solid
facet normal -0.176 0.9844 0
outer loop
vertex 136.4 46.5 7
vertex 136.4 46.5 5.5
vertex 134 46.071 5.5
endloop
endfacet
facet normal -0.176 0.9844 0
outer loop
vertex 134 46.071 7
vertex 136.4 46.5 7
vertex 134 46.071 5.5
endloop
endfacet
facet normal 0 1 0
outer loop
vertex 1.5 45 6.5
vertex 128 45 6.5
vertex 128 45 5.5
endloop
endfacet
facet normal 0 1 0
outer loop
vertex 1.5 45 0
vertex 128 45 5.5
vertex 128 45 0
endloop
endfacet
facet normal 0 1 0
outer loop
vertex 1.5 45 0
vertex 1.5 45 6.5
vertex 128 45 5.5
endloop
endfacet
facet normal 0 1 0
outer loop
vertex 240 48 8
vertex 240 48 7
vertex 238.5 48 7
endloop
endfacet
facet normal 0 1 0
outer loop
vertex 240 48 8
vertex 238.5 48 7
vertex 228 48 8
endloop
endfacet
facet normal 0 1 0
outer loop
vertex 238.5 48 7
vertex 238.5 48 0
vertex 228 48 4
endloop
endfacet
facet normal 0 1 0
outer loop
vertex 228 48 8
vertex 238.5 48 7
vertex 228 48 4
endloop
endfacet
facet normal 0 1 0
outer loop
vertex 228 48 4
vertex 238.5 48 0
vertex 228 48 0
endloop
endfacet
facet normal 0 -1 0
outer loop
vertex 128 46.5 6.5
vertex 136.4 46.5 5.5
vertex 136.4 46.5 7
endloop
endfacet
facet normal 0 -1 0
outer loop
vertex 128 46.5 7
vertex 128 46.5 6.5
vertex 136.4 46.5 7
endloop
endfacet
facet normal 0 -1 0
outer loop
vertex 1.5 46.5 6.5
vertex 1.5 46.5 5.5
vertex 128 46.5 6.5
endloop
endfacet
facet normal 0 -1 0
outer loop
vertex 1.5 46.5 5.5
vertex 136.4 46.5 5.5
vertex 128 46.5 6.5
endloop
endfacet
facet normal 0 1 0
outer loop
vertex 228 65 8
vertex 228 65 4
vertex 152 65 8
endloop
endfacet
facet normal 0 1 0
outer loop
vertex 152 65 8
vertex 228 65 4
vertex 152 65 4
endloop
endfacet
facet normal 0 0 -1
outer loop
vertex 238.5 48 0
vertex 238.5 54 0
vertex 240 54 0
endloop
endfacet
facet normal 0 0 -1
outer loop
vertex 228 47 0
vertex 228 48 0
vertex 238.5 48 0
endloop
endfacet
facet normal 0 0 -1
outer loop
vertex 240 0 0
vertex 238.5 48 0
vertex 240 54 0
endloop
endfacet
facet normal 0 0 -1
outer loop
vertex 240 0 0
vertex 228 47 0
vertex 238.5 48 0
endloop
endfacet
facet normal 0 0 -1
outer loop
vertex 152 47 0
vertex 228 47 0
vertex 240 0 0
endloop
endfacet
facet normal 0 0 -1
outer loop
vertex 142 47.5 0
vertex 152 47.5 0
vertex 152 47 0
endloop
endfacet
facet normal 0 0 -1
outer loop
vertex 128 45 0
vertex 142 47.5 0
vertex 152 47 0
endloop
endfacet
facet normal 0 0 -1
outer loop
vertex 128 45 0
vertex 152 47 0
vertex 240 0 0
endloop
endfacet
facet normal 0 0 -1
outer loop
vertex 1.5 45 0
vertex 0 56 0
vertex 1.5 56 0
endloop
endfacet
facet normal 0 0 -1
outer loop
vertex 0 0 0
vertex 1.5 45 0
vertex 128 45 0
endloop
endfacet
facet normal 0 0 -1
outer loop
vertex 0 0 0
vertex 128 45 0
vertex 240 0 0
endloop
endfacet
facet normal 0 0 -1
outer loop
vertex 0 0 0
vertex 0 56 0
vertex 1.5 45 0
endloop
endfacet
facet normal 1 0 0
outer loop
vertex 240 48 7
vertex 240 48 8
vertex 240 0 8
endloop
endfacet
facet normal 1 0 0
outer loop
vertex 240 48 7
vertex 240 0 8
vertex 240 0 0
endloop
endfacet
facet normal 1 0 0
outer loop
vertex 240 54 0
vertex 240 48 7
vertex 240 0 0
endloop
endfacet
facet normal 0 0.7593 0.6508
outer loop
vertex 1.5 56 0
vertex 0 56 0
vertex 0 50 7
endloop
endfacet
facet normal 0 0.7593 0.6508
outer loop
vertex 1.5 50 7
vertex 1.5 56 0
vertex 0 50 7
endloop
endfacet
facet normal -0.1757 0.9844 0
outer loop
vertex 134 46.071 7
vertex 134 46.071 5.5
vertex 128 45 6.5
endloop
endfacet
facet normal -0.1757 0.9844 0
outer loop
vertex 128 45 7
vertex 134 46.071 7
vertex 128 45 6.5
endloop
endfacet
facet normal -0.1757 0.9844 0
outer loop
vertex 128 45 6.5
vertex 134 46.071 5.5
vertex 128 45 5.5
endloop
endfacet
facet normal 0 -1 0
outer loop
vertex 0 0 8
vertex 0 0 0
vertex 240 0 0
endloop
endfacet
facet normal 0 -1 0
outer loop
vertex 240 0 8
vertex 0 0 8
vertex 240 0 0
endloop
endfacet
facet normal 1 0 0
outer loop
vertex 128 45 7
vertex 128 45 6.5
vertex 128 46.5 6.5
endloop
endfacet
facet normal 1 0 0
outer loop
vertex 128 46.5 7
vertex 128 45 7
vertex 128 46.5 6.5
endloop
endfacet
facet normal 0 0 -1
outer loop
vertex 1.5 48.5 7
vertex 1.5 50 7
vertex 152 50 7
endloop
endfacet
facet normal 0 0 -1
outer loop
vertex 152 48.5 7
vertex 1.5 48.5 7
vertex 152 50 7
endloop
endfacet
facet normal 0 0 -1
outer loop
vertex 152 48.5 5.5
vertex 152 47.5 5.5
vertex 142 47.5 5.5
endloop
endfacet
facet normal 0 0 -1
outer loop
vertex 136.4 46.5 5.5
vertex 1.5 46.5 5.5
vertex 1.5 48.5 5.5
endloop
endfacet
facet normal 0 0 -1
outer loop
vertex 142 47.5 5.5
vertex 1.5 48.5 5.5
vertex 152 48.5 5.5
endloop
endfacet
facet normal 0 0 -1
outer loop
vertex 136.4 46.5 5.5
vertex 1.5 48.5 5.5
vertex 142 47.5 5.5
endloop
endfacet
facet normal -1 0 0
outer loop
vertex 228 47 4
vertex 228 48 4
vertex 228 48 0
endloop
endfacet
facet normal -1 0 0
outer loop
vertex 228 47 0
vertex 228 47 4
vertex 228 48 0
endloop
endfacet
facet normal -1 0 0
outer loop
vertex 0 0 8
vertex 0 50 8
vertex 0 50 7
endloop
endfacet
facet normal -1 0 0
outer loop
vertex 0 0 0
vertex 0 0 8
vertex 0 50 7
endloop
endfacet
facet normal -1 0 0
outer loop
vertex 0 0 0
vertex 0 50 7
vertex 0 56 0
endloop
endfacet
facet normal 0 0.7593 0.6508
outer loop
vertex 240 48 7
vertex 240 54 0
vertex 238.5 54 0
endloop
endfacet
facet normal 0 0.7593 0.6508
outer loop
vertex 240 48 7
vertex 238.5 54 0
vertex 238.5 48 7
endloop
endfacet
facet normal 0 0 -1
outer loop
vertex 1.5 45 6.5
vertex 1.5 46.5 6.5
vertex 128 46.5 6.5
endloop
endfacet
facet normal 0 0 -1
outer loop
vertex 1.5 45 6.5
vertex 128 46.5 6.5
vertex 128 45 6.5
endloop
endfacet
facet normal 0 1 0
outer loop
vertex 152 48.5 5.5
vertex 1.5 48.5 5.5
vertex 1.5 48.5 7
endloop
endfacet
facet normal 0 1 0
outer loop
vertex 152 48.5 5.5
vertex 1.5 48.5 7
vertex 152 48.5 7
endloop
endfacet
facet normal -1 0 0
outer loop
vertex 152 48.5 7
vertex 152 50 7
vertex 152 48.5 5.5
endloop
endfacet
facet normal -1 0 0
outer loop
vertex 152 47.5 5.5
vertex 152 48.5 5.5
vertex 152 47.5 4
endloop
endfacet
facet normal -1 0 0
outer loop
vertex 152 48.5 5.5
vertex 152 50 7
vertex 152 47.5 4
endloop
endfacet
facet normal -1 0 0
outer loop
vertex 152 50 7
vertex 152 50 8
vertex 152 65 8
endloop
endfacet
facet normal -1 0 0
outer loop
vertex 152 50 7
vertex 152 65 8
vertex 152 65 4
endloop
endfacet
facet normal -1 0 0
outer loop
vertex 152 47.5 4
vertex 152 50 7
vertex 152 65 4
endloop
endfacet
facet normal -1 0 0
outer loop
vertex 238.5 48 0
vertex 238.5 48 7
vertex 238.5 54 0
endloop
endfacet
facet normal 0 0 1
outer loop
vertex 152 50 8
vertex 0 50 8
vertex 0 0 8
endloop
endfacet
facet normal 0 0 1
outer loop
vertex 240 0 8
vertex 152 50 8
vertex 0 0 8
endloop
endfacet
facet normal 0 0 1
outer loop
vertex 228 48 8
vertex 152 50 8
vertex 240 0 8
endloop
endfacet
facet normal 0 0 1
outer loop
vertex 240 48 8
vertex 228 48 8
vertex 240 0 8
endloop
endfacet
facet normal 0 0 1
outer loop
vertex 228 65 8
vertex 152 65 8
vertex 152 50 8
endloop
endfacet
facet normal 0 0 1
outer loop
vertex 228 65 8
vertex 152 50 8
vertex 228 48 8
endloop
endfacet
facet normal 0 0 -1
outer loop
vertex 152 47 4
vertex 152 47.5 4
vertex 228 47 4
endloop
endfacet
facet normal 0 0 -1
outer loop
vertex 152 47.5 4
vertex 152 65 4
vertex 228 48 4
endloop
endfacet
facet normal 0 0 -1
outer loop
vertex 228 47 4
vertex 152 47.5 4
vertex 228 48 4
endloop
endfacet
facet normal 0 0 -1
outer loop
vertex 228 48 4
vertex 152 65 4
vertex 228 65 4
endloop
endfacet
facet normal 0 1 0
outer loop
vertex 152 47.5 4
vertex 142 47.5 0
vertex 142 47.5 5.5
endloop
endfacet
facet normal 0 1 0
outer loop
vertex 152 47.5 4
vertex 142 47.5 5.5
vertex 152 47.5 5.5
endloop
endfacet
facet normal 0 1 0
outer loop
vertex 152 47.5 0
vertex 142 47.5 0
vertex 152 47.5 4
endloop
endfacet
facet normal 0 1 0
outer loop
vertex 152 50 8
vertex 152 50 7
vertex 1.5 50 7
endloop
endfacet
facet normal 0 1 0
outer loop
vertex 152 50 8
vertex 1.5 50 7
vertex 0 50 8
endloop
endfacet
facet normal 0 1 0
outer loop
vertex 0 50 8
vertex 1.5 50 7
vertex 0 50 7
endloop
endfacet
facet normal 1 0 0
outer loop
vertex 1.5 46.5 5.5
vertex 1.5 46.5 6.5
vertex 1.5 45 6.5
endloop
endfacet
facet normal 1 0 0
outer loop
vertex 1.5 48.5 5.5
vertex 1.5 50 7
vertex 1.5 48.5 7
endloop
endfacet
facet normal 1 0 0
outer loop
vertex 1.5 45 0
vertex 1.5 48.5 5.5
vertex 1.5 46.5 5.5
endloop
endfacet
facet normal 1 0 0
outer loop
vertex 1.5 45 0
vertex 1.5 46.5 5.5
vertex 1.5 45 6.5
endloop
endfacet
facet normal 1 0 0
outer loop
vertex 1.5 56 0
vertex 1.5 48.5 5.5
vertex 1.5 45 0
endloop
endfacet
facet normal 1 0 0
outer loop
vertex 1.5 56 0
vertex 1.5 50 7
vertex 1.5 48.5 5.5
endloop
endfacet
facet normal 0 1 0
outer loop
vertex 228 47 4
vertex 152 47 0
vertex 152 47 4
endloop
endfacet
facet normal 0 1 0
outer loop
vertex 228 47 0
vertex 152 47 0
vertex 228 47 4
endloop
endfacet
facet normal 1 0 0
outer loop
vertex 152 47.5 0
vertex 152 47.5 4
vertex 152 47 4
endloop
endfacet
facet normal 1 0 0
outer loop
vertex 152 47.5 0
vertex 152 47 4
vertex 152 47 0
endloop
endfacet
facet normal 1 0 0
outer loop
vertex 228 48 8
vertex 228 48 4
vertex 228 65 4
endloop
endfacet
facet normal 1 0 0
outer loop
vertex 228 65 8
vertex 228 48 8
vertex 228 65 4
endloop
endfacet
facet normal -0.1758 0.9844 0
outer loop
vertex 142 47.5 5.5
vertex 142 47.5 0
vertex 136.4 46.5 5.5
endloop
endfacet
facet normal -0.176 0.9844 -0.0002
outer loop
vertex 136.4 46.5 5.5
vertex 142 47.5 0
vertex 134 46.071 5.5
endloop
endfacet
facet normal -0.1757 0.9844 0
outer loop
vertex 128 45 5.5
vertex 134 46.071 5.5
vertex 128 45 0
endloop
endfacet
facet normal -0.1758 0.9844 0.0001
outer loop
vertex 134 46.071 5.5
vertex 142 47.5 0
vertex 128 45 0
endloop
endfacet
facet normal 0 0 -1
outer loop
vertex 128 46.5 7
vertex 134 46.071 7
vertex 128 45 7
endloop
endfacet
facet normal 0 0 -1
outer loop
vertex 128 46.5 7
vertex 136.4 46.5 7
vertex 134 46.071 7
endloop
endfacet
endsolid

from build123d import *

# Parameters (mm, degrees)
SALIENTE_EXTRUIR1_DEPTH = 8
CROQUIS6_W              = 152
CROQUIS6_H              = 1.5
CORTAR_EXTRUIR10_DEPTH  = 1.5
CORTAR_EXTRUIR12_DEPTH  = 128
CROQUIS12_W             = 24
CROQUIS12_H             = 5.5
CORTAR_EXTRUIR13_DEPTH  = 1.5
CORTAR_EXTRUIR14_DEPTH  = 5.5
CORTAR_EXTRUIR16_DEPTH  = 1.5
CROQUIS17_W             = 76
CROQUIS17_H             = 4
CORTAR_EXTRUIR17_DEPTH  = 18
CROQUIS18_W             = 10
CROQUIS18_H             = 5.5
CORTAR_EXTRUIR18_DEPTH  = 1
CORTAR_EXTRUIR22_DEPTH  = 5
CORTAR_EXTRUIR23_DEPTH  = 0.5
CORTAR_EXTRUIR25_DEPTH  = 1.5
SALIENTE_EXTRUIR3_DEPTH = 1.5
SALIENTE_EXTRUIR4_DEPTH = 1.5


with BuildPart() as part:
    # Croquis2 → Saliente-Extruir1 (new body)
    with BuildSketch(Plane.XY):
        Polygon((0, 0), (240, 0), (240, 48), (228, 48), (228, 65), (152, 65), (152, 50), (0, 50), align=None)
    extrude(amount=SALIENTE_EXTRUIR1_DEPTH)

    # Croquis6 → Cortar-Extruir10 (cut)
    with BuildSketch(Plane(origin=(0, 50, 0), x_dir=(1, 0, 0), z_dir=(0, 1, 0))):
        with Locations((76, -6.25)):
            Rectangle(CROQUIS6_W, CROQUIS6_H)
    extrude(amount=-CORTAR_EXTRUIR10_DEPTH, mode=Mode.SUBTRACT)

    # Croquis9 → Cortar-Extruir12 (cut)
    with BuildSketch(Plane.ZY):
        Polygon((5.5, 48.5), (5.5, 46.5), (6.5, 46.5), (6.5, 45), (0, 45), (0, 50), (5.5, 50), align=None)
    extrude(amount=-CORTAR_EXTRUIR12_DEPTH, mode=Mode.SUBTRACT)

    # Croquis12 → Cortar-Extruir13 (cut)
    with BuildSketch(Plane(origin=(0, 50, 0), x_dir=(1, 0, 0), z_dir=(0, 1, 0))):
        with Locations((140, -2.75)):
            Rectangle(CROQUIS12_W, CROQUIS12_H)
    extrude(amount=-CORTAR_EXTRUIR13_DEPTH, mode=Mode.SUBTRACT)

    # Croquis13 → Cortar-Extruir14 (cut)
    with BuildSketch(Plane(origin=(0, 0, 0), x_dir=(-1, 0, 0), z_dir=(0, 0, -1))):
        Polygon((-142, 48.5), (-128, 45), (-128, 48.5), align=None)
    extrude(amount=-CORTAR_EXTRUIR14_DEPTH, mode=Mode.SUBTRACT)

    # Croquis14 → Cortar-Extruir16 (cut)
    with BuildSketch(Plane(origin=(0, 0, 5.5), x_dir=(-1, 0, 0), z_dir=(0, 0, -1))):
        Polygon((-128, 45), (-128, 46.5), (-134, 46.5), align=None)
    extrude(amount=-CORTAR_EXTRUIR16_DEPTH, mode=Mode.SUBTRACT)

    # Croquis17 → Cortar-Extruir17 (cut)
    with BuildSketch(Plane(origin=(0, 65, 0), x_dir=(1, 0, 0), z_dir=(0, 1, 0))):
        with Locations((190, -2)):
            Rectangle(CROQUIS17_W, CROQUIS17_H)
    extrude(amount=-CORTAR_EXTRUIR17_DEPTH, mode=Mode.SUBTRACT)

    # Croquis18 → Cortar-Extruir18 (cut)
    with BuildSketch(Plane(origin=(0, 48.5, 0), x_dir=(1, 0, 0), z_dir=(0, 1, 0))):
        with Locations((147, -2.75)):
            Rectangle(CROQUIS18_W, CROQUIS18_H)
    extrude(amount=-CORTAR_EXTRUIR18_DEPTH, mode=Mode.SUBTRACT)

    # Croquis19 → Cortar-Extruir22 (cut)
    with BuildSketch(Plane(origin=(0, 0, 0), x_dir=(-1, 0, 0), z_dir=(0, 0, -1))):
        Polygon((-142, 47.5), (-128, 45), (-142, 48.5), align=None)
    extrude(amount=-CORTAR_EXTRUIR22_DEPTH, mode=Mode.SUBTRACT)

    # Croquis20 → Cortar-Extruir23 (cut)
    with BuildSketch(Plane(origin=(0, 0, 5), x_dir=(-1, 0, 0), z_dir=(0, 0, -1))):
        Polygon((-142, 48.5), (-142, 47.5), (-128, 45), align=None)
    extrude(amount=-CORTAR_EXTRUIR23_DEPTH, mode=Mode.SUBTRACT)

    # Croquis21 → Cortar-Extruir25 (cut)
    with BuildSketch(Plane(origin=(0, 0, 5.5), x_dir=(-1, 0, 0), z_dir=(0, 0, -1))):
        Polygon((-134, 46.5), (-136.4, 46.5), (-134, 46.071428571), (-128, 45), align=None)
    extrude(amount=-CORTAR_EXTRUIR25_DEPTH, mode=Mode.SUBTRACT)

    # Croquis22 → Saliente-Extruir3 (add)
    with BuildSketch(Plane(origin=(240, 0, 0), x_dir=(0, 0, -1), z_dir=(1, 0, 0))):
        Polygon((0, 48), (0, 54), (-7, 48), align=None)
    extrude(amount=-SALIENTE_EXTRUIR3_DEPTH)

    # Croquis23 → Saliente-Extruir4 (add)
    with BuildSketch(Plane.ZY):
        Polygon((0, 50), (0, 56), (7, 50), (7, 48.5), (5.5, 48.5), (5.5, 46.5), (6.5, 46.5), (6.5, 45), (0, 45), align=None)
    extrude(amount=-SALIENTE_EXTRUIR4_DEPTH)


solid = part.part
